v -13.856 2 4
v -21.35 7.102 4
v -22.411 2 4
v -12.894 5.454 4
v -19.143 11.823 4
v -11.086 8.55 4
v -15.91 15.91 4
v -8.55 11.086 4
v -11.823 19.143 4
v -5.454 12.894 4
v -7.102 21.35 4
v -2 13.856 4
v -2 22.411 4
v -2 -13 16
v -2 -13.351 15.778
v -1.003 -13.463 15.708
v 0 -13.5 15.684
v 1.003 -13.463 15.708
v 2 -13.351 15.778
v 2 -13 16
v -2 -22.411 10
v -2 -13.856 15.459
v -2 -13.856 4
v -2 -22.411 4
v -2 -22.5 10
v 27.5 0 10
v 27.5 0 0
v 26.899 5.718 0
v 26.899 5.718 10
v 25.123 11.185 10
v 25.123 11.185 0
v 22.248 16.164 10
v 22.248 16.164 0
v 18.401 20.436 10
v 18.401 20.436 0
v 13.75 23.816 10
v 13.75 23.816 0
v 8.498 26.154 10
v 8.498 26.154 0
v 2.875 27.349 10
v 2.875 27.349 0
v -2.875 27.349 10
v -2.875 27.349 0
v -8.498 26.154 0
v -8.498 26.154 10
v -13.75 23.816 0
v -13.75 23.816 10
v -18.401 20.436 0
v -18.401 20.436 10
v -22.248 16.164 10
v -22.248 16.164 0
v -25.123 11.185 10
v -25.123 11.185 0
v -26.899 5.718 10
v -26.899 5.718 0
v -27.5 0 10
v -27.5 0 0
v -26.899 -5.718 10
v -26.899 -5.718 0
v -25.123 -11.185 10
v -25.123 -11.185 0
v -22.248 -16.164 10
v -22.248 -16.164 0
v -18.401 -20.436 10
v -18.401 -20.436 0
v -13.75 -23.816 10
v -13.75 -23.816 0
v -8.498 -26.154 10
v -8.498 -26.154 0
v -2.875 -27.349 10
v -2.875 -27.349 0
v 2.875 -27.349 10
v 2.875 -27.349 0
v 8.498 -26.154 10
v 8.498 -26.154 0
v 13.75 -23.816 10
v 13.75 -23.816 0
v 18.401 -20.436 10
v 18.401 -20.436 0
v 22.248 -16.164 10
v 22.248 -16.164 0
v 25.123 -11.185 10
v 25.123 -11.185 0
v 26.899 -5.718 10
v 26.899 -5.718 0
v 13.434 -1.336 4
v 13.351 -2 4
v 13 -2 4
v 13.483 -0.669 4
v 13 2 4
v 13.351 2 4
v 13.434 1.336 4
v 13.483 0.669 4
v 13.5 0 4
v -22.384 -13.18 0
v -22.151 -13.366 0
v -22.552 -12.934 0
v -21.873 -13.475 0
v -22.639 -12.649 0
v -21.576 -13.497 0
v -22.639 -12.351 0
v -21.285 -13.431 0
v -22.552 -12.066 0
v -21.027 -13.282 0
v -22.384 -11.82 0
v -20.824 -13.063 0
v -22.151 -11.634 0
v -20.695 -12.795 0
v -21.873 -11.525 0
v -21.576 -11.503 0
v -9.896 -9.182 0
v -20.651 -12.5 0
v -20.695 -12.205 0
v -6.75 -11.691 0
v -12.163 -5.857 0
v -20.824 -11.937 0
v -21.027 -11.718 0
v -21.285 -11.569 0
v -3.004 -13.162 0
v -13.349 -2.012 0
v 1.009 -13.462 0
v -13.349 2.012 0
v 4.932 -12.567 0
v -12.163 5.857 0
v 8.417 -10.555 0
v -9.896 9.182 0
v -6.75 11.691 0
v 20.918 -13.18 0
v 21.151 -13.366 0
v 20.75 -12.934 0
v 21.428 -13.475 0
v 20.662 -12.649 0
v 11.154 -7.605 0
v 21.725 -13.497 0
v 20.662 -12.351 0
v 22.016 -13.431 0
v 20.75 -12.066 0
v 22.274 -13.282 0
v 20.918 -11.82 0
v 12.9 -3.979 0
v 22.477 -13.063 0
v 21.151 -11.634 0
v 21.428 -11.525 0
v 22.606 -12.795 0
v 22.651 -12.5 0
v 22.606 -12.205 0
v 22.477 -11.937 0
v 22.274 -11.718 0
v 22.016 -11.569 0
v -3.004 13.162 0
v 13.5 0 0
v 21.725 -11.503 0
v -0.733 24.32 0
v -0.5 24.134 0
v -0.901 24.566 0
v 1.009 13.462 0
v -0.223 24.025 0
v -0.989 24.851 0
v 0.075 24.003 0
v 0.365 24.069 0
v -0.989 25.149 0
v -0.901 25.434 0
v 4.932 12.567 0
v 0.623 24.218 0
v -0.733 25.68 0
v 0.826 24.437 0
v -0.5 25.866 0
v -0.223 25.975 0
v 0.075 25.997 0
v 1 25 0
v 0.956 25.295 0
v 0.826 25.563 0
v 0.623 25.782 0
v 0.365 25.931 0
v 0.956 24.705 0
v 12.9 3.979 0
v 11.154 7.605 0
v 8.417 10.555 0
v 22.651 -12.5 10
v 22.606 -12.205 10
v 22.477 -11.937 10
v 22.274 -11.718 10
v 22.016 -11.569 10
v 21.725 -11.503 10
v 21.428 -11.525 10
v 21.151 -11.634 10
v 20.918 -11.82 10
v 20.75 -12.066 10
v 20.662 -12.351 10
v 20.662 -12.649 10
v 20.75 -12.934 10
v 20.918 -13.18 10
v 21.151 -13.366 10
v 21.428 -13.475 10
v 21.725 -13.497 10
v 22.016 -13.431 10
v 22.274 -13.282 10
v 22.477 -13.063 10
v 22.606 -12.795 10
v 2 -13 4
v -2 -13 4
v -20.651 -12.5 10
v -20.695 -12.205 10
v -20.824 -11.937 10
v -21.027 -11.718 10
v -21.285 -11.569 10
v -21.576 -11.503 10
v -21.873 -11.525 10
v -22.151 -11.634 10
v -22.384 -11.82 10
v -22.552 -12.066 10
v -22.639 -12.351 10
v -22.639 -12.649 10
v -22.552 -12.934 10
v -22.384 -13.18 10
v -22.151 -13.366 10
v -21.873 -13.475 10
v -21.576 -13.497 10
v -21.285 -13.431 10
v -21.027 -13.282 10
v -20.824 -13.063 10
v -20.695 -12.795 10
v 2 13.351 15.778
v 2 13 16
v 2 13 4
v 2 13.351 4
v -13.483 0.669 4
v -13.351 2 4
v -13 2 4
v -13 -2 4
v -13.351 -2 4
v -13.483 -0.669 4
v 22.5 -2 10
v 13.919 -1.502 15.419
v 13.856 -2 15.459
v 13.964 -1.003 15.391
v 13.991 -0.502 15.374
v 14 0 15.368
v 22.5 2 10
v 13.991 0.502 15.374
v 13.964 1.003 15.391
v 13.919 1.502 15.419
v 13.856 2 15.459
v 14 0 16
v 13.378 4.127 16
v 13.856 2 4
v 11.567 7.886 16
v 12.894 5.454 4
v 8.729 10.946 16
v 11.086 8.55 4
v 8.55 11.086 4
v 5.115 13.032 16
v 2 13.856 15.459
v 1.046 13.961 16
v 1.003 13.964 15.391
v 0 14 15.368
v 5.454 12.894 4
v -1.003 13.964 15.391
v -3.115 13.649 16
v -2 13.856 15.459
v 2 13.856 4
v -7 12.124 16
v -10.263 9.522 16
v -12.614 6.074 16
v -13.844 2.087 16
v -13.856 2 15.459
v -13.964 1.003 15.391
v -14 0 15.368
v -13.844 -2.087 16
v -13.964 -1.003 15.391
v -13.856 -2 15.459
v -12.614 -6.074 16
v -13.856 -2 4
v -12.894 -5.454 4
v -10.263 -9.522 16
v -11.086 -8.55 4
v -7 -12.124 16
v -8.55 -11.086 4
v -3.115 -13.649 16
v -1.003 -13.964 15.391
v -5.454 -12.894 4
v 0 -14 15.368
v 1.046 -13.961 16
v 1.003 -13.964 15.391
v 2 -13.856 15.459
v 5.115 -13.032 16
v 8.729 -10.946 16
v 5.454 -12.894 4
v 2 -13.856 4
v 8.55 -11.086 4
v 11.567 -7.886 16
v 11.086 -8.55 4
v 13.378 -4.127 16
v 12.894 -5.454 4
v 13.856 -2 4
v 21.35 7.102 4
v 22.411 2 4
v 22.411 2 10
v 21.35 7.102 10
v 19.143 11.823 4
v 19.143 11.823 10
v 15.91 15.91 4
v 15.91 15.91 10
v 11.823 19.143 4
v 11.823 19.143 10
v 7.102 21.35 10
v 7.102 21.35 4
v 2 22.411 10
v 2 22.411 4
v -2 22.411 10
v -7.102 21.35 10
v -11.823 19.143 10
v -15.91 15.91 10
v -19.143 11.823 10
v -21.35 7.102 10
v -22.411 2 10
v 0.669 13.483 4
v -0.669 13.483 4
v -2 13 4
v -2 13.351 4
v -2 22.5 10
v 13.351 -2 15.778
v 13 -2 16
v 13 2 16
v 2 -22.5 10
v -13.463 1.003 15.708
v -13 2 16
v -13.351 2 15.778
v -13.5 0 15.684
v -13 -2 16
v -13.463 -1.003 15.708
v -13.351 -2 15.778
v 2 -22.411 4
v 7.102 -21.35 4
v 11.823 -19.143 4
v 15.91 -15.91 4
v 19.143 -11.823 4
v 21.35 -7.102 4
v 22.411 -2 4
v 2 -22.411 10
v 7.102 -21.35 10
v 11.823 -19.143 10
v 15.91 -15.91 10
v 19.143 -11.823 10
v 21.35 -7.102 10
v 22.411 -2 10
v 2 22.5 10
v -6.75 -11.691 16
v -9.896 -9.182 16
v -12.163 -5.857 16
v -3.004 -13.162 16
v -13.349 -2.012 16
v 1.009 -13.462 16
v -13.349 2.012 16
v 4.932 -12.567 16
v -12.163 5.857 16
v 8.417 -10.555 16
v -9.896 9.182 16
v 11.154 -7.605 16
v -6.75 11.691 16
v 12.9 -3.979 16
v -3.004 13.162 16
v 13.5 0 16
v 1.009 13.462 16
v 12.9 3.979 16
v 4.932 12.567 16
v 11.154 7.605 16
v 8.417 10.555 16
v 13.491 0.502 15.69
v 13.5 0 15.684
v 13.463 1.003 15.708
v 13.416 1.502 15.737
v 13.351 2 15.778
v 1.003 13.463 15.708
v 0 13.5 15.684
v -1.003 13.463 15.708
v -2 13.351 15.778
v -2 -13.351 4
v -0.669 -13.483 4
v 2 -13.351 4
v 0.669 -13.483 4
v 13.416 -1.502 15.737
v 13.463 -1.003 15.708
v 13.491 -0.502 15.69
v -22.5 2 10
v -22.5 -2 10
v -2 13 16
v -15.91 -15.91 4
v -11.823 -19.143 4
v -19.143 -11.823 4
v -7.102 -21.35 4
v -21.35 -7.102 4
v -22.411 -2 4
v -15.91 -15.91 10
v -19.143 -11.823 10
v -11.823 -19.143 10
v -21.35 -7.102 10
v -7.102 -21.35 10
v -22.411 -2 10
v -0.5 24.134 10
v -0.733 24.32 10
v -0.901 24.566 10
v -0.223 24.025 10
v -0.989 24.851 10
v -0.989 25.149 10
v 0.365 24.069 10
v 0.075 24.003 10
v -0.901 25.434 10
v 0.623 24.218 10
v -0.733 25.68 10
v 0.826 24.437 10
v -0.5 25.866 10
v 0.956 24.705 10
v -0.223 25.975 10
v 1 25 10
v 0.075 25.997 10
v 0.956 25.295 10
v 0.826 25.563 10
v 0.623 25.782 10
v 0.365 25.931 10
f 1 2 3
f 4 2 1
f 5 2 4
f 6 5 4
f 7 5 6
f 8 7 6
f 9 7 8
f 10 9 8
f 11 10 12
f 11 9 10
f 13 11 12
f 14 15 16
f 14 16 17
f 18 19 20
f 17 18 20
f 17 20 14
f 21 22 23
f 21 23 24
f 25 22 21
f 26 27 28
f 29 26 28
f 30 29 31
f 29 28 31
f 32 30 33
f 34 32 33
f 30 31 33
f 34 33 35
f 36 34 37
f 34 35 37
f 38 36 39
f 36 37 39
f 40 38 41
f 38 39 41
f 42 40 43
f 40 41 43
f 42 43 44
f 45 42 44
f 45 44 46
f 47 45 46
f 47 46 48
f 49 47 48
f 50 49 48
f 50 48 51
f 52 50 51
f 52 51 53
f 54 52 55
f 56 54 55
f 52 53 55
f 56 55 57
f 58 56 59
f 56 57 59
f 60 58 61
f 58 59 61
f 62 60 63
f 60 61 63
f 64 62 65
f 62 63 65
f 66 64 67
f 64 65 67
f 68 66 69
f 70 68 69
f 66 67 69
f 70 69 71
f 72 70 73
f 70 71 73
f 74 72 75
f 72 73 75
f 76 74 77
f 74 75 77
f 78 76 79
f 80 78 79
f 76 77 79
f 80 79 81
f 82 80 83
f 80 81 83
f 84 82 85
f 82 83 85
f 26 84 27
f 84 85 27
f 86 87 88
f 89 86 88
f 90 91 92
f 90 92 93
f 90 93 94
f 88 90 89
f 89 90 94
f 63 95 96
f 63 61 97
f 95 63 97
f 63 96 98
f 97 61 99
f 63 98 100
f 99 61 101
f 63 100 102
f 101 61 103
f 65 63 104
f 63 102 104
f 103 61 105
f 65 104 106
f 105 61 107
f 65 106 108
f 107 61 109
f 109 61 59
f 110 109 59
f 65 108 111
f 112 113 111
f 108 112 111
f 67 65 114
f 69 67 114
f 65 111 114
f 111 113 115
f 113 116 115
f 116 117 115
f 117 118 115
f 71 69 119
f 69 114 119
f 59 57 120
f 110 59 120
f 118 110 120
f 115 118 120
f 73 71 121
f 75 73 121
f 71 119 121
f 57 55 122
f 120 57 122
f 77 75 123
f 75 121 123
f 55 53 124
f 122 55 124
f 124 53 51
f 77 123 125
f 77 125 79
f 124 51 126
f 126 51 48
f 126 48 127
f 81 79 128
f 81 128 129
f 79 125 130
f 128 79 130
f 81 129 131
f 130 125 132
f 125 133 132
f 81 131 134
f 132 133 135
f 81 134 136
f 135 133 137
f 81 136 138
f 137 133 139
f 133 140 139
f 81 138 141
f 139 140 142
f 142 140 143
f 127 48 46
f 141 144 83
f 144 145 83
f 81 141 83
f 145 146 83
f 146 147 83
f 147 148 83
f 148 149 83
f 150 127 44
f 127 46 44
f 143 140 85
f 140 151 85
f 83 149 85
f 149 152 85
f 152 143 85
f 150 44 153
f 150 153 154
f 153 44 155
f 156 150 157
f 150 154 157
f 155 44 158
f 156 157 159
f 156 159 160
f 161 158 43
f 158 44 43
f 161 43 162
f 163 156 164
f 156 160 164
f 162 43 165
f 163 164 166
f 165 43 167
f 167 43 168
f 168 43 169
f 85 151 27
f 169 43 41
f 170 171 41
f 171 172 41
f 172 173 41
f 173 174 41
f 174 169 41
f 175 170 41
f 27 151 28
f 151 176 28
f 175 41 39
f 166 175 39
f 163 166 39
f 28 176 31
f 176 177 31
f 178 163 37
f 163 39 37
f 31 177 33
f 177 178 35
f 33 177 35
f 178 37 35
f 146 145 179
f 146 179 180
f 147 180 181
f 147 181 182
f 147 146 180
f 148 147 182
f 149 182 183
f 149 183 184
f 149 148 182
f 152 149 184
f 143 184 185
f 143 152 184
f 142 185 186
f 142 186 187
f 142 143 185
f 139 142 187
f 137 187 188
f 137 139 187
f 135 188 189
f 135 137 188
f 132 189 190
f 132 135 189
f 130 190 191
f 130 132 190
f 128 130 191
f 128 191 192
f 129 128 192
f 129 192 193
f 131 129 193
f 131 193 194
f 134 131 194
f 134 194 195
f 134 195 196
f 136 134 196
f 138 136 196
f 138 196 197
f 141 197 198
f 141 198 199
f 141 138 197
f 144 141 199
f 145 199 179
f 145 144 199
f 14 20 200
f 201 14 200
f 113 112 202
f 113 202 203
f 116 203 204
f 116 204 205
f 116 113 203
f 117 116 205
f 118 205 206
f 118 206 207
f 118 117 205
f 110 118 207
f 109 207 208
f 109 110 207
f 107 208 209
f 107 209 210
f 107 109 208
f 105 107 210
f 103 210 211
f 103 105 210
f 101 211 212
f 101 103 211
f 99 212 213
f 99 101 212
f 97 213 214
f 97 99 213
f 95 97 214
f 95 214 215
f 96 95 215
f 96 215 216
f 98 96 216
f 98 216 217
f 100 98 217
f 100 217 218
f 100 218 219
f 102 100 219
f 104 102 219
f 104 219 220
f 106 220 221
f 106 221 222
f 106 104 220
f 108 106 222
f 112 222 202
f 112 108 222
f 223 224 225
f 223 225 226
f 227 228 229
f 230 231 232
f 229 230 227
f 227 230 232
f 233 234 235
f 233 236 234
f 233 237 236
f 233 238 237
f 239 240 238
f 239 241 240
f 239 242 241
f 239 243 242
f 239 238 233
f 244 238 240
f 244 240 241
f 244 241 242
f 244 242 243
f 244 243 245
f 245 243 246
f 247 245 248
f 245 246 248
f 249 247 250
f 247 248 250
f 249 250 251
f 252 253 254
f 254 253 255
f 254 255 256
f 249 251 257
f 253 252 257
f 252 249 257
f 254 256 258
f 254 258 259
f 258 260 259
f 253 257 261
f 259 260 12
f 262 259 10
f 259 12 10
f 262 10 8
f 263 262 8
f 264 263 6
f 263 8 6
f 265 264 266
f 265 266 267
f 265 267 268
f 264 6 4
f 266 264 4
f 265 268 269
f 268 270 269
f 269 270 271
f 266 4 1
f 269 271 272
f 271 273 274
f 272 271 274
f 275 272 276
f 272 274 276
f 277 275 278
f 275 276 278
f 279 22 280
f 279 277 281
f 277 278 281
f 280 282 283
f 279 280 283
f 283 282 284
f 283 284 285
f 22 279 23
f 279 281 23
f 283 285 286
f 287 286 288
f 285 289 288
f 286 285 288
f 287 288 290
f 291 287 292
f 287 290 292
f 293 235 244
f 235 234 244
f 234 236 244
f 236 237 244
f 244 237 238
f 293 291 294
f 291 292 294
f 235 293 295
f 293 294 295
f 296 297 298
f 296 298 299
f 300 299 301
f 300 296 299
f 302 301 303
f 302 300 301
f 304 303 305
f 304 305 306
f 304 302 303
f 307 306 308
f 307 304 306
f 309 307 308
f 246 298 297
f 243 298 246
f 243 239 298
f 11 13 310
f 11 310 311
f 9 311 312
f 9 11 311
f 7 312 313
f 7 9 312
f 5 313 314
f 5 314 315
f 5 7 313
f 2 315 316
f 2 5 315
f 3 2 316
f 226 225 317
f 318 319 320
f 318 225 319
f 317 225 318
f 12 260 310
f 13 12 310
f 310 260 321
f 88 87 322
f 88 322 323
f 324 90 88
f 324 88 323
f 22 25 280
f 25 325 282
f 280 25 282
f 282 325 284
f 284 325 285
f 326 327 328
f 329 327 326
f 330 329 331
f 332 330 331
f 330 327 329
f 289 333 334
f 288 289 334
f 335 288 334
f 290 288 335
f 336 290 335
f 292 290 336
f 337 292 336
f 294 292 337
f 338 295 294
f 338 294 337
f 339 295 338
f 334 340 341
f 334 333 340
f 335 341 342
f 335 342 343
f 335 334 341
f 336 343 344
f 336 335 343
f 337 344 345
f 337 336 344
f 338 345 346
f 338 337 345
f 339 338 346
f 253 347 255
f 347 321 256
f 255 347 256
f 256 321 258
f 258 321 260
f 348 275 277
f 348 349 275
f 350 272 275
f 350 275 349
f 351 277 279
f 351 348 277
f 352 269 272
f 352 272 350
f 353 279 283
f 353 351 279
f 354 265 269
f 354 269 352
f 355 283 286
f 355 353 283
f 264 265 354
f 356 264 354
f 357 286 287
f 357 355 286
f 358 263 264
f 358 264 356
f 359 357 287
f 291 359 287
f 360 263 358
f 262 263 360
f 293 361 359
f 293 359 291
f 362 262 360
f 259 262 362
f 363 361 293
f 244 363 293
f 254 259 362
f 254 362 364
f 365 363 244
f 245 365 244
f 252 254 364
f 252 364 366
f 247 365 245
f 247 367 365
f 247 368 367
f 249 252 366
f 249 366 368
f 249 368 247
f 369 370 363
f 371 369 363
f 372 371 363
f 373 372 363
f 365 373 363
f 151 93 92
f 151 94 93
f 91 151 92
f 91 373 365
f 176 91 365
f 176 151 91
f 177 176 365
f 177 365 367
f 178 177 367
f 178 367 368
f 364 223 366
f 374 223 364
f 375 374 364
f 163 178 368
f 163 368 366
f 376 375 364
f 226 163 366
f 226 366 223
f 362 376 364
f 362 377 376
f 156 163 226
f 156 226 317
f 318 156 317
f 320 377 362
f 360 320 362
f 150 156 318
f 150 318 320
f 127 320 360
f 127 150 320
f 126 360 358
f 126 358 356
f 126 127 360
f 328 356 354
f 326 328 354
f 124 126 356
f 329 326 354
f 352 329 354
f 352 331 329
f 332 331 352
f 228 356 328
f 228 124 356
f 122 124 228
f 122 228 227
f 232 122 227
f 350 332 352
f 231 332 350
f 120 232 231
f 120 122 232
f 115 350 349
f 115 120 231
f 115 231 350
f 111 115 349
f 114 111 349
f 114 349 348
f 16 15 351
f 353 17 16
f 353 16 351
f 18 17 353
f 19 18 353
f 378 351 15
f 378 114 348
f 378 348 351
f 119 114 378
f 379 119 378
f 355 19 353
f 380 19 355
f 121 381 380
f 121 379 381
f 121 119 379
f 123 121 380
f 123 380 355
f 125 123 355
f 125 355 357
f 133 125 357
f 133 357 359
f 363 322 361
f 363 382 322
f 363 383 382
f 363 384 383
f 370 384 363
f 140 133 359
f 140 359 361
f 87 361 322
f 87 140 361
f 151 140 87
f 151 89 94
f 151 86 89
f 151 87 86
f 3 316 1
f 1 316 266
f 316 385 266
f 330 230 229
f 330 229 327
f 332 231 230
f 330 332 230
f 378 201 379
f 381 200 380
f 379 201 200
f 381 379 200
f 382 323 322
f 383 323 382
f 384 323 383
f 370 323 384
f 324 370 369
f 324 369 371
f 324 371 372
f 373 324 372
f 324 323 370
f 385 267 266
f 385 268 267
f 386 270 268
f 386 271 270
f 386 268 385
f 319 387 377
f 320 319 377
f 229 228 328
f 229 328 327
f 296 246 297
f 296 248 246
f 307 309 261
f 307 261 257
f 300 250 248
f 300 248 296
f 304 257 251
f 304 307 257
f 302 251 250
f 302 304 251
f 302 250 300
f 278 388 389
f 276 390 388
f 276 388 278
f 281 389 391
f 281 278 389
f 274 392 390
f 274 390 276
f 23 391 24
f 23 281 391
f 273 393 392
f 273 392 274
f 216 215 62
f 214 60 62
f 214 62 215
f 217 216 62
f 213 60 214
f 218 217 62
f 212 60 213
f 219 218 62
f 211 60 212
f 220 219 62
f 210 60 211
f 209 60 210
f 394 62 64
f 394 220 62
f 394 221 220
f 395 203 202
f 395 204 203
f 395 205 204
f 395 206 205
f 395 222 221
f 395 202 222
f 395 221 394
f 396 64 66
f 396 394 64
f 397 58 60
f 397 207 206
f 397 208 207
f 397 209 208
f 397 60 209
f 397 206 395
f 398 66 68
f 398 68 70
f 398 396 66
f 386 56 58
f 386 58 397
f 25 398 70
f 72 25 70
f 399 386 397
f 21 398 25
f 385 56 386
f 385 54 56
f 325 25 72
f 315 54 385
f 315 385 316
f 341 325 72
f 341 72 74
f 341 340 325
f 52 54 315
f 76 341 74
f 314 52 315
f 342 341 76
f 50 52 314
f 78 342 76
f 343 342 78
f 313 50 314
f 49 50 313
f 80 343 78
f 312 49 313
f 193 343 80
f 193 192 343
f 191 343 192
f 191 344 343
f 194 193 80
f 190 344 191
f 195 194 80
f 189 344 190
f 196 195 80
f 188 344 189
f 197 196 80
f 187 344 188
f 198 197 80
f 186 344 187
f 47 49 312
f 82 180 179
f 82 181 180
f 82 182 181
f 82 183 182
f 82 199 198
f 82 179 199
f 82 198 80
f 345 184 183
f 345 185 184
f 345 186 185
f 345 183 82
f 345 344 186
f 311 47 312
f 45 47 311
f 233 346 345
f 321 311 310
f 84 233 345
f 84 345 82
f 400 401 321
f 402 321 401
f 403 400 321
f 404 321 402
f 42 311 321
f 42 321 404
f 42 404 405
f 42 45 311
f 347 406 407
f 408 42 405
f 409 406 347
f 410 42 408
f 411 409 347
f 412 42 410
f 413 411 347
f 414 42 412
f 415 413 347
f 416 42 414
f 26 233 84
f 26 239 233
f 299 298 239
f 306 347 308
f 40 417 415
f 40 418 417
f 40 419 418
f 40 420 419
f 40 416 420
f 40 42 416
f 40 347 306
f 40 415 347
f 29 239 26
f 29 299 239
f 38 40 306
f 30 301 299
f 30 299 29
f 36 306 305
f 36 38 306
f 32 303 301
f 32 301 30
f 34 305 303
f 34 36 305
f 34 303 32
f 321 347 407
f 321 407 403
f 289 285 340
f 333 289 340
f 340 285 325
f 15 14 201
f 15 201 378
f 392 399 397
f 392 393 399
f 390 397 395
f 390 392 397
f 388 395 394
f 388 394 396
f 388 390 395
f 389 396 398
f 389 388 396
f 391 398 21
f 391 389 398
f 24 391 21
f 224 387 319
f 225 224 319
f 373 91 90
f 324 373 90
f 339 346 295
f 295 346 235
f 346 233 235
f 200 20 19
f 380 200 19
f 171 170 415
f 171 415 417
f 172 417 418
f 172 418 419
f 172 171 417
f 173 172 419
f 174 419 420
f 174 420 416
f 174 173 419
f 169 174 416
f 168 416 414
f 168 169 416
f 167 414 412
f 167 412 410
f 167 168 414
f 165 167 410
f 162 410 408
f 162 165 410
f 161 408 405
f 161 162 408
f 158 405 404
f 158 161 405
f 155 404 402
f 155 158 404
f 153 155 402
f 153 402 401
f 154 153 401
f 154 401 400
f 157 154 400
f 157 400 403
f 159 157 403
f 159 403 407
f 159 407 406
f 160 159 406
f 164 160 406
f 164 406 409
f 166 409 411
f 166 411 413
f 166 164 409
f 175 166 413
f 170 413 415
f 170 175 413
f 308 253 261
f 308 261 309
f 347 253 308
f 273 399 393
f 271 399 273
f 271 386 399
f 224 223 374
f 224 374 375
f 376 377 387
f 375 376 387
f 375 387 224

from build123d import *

# Parameters (mm, degrees)
SKETCH_R      = 27.5
SKETCH_R_2    = 22.5
SKETCH_R_3    = 1
PAD_DEPTH     = 10
SKETCH001_R   = 22.5
SKETCH001_R_2 = 14
PAD001_DEPTH  = 4
PAD002_DEPTH  = 2
PAD003_DEPTH  = 2
SKETCH004_R   = 14
SKETCH004_R_2 = 13.5
PAD004_DEPTH  = 16


with BuildPart() as part:
    # Sketch → Pad (new body)
    with BuildSketch(Plane.XY):
        Circle(SKETCH_R)
        Circle(SKETCH_R_2, mode=Mode.SUBTRACT)
        with Locations((0, 25)):
            Circle(SKETCH_R_3, mode=Mode.SUBTRACT)
        with Locations((-21.650635, -12.5)):
            Circle(SKETCH_R_3, mode=Mode.SUBTRACT)
        with Locations((21.650635, -12.5)):
            Circle(SKETCH_R_3, mode=Mode.SUBTRACT)
    extrude(amount=PAD_DEPTH)

    # Sketch001 → Pad001 (join)
    with BuildSketch(Plane.XY):
        Circle(SKETCH001_R)
        Circle(SKETCH001_R_2, mode=Mode.SUBTRACT)
    extrude(amount=PAD001_DEPTH)

    # Sketch002 → Pad002 (join, symmetric)
    with BuildSketch(Plane.XZ):
        Polygon((22.5, 10), (22.5, 4), (13, 4), (13, 16), align=None)
        Polygon((-22.5, 10), (-22.5, 4), (-13, 4), (-13, 16), align=None)
    extrude(amount=PAD002_DEPTH, both=True)

    # Sketch003 → Pad003 (join, symmetric)
    with BuildSketch(Plane.YZ):
        Polygon((13, 4), (22.5, 4), (22.5, 10), (13, 16), align=None)
        Polygon((-13, 4), (-22.5, 4), (-22.5, 10), (-13, 16), align=None)
    extrude(amount=PAD003_DEPTH, both=True)

    # Sketch004 → Pad004 (join)
    with BuildSketch(Plane.XY):
        Circle(SKETCH004_R)
        Circle(SKETCH004_R_2, mode=Mode.SUBTRACT)
    extrude(amount=PAD004_DEPTH)


solid = part.part
